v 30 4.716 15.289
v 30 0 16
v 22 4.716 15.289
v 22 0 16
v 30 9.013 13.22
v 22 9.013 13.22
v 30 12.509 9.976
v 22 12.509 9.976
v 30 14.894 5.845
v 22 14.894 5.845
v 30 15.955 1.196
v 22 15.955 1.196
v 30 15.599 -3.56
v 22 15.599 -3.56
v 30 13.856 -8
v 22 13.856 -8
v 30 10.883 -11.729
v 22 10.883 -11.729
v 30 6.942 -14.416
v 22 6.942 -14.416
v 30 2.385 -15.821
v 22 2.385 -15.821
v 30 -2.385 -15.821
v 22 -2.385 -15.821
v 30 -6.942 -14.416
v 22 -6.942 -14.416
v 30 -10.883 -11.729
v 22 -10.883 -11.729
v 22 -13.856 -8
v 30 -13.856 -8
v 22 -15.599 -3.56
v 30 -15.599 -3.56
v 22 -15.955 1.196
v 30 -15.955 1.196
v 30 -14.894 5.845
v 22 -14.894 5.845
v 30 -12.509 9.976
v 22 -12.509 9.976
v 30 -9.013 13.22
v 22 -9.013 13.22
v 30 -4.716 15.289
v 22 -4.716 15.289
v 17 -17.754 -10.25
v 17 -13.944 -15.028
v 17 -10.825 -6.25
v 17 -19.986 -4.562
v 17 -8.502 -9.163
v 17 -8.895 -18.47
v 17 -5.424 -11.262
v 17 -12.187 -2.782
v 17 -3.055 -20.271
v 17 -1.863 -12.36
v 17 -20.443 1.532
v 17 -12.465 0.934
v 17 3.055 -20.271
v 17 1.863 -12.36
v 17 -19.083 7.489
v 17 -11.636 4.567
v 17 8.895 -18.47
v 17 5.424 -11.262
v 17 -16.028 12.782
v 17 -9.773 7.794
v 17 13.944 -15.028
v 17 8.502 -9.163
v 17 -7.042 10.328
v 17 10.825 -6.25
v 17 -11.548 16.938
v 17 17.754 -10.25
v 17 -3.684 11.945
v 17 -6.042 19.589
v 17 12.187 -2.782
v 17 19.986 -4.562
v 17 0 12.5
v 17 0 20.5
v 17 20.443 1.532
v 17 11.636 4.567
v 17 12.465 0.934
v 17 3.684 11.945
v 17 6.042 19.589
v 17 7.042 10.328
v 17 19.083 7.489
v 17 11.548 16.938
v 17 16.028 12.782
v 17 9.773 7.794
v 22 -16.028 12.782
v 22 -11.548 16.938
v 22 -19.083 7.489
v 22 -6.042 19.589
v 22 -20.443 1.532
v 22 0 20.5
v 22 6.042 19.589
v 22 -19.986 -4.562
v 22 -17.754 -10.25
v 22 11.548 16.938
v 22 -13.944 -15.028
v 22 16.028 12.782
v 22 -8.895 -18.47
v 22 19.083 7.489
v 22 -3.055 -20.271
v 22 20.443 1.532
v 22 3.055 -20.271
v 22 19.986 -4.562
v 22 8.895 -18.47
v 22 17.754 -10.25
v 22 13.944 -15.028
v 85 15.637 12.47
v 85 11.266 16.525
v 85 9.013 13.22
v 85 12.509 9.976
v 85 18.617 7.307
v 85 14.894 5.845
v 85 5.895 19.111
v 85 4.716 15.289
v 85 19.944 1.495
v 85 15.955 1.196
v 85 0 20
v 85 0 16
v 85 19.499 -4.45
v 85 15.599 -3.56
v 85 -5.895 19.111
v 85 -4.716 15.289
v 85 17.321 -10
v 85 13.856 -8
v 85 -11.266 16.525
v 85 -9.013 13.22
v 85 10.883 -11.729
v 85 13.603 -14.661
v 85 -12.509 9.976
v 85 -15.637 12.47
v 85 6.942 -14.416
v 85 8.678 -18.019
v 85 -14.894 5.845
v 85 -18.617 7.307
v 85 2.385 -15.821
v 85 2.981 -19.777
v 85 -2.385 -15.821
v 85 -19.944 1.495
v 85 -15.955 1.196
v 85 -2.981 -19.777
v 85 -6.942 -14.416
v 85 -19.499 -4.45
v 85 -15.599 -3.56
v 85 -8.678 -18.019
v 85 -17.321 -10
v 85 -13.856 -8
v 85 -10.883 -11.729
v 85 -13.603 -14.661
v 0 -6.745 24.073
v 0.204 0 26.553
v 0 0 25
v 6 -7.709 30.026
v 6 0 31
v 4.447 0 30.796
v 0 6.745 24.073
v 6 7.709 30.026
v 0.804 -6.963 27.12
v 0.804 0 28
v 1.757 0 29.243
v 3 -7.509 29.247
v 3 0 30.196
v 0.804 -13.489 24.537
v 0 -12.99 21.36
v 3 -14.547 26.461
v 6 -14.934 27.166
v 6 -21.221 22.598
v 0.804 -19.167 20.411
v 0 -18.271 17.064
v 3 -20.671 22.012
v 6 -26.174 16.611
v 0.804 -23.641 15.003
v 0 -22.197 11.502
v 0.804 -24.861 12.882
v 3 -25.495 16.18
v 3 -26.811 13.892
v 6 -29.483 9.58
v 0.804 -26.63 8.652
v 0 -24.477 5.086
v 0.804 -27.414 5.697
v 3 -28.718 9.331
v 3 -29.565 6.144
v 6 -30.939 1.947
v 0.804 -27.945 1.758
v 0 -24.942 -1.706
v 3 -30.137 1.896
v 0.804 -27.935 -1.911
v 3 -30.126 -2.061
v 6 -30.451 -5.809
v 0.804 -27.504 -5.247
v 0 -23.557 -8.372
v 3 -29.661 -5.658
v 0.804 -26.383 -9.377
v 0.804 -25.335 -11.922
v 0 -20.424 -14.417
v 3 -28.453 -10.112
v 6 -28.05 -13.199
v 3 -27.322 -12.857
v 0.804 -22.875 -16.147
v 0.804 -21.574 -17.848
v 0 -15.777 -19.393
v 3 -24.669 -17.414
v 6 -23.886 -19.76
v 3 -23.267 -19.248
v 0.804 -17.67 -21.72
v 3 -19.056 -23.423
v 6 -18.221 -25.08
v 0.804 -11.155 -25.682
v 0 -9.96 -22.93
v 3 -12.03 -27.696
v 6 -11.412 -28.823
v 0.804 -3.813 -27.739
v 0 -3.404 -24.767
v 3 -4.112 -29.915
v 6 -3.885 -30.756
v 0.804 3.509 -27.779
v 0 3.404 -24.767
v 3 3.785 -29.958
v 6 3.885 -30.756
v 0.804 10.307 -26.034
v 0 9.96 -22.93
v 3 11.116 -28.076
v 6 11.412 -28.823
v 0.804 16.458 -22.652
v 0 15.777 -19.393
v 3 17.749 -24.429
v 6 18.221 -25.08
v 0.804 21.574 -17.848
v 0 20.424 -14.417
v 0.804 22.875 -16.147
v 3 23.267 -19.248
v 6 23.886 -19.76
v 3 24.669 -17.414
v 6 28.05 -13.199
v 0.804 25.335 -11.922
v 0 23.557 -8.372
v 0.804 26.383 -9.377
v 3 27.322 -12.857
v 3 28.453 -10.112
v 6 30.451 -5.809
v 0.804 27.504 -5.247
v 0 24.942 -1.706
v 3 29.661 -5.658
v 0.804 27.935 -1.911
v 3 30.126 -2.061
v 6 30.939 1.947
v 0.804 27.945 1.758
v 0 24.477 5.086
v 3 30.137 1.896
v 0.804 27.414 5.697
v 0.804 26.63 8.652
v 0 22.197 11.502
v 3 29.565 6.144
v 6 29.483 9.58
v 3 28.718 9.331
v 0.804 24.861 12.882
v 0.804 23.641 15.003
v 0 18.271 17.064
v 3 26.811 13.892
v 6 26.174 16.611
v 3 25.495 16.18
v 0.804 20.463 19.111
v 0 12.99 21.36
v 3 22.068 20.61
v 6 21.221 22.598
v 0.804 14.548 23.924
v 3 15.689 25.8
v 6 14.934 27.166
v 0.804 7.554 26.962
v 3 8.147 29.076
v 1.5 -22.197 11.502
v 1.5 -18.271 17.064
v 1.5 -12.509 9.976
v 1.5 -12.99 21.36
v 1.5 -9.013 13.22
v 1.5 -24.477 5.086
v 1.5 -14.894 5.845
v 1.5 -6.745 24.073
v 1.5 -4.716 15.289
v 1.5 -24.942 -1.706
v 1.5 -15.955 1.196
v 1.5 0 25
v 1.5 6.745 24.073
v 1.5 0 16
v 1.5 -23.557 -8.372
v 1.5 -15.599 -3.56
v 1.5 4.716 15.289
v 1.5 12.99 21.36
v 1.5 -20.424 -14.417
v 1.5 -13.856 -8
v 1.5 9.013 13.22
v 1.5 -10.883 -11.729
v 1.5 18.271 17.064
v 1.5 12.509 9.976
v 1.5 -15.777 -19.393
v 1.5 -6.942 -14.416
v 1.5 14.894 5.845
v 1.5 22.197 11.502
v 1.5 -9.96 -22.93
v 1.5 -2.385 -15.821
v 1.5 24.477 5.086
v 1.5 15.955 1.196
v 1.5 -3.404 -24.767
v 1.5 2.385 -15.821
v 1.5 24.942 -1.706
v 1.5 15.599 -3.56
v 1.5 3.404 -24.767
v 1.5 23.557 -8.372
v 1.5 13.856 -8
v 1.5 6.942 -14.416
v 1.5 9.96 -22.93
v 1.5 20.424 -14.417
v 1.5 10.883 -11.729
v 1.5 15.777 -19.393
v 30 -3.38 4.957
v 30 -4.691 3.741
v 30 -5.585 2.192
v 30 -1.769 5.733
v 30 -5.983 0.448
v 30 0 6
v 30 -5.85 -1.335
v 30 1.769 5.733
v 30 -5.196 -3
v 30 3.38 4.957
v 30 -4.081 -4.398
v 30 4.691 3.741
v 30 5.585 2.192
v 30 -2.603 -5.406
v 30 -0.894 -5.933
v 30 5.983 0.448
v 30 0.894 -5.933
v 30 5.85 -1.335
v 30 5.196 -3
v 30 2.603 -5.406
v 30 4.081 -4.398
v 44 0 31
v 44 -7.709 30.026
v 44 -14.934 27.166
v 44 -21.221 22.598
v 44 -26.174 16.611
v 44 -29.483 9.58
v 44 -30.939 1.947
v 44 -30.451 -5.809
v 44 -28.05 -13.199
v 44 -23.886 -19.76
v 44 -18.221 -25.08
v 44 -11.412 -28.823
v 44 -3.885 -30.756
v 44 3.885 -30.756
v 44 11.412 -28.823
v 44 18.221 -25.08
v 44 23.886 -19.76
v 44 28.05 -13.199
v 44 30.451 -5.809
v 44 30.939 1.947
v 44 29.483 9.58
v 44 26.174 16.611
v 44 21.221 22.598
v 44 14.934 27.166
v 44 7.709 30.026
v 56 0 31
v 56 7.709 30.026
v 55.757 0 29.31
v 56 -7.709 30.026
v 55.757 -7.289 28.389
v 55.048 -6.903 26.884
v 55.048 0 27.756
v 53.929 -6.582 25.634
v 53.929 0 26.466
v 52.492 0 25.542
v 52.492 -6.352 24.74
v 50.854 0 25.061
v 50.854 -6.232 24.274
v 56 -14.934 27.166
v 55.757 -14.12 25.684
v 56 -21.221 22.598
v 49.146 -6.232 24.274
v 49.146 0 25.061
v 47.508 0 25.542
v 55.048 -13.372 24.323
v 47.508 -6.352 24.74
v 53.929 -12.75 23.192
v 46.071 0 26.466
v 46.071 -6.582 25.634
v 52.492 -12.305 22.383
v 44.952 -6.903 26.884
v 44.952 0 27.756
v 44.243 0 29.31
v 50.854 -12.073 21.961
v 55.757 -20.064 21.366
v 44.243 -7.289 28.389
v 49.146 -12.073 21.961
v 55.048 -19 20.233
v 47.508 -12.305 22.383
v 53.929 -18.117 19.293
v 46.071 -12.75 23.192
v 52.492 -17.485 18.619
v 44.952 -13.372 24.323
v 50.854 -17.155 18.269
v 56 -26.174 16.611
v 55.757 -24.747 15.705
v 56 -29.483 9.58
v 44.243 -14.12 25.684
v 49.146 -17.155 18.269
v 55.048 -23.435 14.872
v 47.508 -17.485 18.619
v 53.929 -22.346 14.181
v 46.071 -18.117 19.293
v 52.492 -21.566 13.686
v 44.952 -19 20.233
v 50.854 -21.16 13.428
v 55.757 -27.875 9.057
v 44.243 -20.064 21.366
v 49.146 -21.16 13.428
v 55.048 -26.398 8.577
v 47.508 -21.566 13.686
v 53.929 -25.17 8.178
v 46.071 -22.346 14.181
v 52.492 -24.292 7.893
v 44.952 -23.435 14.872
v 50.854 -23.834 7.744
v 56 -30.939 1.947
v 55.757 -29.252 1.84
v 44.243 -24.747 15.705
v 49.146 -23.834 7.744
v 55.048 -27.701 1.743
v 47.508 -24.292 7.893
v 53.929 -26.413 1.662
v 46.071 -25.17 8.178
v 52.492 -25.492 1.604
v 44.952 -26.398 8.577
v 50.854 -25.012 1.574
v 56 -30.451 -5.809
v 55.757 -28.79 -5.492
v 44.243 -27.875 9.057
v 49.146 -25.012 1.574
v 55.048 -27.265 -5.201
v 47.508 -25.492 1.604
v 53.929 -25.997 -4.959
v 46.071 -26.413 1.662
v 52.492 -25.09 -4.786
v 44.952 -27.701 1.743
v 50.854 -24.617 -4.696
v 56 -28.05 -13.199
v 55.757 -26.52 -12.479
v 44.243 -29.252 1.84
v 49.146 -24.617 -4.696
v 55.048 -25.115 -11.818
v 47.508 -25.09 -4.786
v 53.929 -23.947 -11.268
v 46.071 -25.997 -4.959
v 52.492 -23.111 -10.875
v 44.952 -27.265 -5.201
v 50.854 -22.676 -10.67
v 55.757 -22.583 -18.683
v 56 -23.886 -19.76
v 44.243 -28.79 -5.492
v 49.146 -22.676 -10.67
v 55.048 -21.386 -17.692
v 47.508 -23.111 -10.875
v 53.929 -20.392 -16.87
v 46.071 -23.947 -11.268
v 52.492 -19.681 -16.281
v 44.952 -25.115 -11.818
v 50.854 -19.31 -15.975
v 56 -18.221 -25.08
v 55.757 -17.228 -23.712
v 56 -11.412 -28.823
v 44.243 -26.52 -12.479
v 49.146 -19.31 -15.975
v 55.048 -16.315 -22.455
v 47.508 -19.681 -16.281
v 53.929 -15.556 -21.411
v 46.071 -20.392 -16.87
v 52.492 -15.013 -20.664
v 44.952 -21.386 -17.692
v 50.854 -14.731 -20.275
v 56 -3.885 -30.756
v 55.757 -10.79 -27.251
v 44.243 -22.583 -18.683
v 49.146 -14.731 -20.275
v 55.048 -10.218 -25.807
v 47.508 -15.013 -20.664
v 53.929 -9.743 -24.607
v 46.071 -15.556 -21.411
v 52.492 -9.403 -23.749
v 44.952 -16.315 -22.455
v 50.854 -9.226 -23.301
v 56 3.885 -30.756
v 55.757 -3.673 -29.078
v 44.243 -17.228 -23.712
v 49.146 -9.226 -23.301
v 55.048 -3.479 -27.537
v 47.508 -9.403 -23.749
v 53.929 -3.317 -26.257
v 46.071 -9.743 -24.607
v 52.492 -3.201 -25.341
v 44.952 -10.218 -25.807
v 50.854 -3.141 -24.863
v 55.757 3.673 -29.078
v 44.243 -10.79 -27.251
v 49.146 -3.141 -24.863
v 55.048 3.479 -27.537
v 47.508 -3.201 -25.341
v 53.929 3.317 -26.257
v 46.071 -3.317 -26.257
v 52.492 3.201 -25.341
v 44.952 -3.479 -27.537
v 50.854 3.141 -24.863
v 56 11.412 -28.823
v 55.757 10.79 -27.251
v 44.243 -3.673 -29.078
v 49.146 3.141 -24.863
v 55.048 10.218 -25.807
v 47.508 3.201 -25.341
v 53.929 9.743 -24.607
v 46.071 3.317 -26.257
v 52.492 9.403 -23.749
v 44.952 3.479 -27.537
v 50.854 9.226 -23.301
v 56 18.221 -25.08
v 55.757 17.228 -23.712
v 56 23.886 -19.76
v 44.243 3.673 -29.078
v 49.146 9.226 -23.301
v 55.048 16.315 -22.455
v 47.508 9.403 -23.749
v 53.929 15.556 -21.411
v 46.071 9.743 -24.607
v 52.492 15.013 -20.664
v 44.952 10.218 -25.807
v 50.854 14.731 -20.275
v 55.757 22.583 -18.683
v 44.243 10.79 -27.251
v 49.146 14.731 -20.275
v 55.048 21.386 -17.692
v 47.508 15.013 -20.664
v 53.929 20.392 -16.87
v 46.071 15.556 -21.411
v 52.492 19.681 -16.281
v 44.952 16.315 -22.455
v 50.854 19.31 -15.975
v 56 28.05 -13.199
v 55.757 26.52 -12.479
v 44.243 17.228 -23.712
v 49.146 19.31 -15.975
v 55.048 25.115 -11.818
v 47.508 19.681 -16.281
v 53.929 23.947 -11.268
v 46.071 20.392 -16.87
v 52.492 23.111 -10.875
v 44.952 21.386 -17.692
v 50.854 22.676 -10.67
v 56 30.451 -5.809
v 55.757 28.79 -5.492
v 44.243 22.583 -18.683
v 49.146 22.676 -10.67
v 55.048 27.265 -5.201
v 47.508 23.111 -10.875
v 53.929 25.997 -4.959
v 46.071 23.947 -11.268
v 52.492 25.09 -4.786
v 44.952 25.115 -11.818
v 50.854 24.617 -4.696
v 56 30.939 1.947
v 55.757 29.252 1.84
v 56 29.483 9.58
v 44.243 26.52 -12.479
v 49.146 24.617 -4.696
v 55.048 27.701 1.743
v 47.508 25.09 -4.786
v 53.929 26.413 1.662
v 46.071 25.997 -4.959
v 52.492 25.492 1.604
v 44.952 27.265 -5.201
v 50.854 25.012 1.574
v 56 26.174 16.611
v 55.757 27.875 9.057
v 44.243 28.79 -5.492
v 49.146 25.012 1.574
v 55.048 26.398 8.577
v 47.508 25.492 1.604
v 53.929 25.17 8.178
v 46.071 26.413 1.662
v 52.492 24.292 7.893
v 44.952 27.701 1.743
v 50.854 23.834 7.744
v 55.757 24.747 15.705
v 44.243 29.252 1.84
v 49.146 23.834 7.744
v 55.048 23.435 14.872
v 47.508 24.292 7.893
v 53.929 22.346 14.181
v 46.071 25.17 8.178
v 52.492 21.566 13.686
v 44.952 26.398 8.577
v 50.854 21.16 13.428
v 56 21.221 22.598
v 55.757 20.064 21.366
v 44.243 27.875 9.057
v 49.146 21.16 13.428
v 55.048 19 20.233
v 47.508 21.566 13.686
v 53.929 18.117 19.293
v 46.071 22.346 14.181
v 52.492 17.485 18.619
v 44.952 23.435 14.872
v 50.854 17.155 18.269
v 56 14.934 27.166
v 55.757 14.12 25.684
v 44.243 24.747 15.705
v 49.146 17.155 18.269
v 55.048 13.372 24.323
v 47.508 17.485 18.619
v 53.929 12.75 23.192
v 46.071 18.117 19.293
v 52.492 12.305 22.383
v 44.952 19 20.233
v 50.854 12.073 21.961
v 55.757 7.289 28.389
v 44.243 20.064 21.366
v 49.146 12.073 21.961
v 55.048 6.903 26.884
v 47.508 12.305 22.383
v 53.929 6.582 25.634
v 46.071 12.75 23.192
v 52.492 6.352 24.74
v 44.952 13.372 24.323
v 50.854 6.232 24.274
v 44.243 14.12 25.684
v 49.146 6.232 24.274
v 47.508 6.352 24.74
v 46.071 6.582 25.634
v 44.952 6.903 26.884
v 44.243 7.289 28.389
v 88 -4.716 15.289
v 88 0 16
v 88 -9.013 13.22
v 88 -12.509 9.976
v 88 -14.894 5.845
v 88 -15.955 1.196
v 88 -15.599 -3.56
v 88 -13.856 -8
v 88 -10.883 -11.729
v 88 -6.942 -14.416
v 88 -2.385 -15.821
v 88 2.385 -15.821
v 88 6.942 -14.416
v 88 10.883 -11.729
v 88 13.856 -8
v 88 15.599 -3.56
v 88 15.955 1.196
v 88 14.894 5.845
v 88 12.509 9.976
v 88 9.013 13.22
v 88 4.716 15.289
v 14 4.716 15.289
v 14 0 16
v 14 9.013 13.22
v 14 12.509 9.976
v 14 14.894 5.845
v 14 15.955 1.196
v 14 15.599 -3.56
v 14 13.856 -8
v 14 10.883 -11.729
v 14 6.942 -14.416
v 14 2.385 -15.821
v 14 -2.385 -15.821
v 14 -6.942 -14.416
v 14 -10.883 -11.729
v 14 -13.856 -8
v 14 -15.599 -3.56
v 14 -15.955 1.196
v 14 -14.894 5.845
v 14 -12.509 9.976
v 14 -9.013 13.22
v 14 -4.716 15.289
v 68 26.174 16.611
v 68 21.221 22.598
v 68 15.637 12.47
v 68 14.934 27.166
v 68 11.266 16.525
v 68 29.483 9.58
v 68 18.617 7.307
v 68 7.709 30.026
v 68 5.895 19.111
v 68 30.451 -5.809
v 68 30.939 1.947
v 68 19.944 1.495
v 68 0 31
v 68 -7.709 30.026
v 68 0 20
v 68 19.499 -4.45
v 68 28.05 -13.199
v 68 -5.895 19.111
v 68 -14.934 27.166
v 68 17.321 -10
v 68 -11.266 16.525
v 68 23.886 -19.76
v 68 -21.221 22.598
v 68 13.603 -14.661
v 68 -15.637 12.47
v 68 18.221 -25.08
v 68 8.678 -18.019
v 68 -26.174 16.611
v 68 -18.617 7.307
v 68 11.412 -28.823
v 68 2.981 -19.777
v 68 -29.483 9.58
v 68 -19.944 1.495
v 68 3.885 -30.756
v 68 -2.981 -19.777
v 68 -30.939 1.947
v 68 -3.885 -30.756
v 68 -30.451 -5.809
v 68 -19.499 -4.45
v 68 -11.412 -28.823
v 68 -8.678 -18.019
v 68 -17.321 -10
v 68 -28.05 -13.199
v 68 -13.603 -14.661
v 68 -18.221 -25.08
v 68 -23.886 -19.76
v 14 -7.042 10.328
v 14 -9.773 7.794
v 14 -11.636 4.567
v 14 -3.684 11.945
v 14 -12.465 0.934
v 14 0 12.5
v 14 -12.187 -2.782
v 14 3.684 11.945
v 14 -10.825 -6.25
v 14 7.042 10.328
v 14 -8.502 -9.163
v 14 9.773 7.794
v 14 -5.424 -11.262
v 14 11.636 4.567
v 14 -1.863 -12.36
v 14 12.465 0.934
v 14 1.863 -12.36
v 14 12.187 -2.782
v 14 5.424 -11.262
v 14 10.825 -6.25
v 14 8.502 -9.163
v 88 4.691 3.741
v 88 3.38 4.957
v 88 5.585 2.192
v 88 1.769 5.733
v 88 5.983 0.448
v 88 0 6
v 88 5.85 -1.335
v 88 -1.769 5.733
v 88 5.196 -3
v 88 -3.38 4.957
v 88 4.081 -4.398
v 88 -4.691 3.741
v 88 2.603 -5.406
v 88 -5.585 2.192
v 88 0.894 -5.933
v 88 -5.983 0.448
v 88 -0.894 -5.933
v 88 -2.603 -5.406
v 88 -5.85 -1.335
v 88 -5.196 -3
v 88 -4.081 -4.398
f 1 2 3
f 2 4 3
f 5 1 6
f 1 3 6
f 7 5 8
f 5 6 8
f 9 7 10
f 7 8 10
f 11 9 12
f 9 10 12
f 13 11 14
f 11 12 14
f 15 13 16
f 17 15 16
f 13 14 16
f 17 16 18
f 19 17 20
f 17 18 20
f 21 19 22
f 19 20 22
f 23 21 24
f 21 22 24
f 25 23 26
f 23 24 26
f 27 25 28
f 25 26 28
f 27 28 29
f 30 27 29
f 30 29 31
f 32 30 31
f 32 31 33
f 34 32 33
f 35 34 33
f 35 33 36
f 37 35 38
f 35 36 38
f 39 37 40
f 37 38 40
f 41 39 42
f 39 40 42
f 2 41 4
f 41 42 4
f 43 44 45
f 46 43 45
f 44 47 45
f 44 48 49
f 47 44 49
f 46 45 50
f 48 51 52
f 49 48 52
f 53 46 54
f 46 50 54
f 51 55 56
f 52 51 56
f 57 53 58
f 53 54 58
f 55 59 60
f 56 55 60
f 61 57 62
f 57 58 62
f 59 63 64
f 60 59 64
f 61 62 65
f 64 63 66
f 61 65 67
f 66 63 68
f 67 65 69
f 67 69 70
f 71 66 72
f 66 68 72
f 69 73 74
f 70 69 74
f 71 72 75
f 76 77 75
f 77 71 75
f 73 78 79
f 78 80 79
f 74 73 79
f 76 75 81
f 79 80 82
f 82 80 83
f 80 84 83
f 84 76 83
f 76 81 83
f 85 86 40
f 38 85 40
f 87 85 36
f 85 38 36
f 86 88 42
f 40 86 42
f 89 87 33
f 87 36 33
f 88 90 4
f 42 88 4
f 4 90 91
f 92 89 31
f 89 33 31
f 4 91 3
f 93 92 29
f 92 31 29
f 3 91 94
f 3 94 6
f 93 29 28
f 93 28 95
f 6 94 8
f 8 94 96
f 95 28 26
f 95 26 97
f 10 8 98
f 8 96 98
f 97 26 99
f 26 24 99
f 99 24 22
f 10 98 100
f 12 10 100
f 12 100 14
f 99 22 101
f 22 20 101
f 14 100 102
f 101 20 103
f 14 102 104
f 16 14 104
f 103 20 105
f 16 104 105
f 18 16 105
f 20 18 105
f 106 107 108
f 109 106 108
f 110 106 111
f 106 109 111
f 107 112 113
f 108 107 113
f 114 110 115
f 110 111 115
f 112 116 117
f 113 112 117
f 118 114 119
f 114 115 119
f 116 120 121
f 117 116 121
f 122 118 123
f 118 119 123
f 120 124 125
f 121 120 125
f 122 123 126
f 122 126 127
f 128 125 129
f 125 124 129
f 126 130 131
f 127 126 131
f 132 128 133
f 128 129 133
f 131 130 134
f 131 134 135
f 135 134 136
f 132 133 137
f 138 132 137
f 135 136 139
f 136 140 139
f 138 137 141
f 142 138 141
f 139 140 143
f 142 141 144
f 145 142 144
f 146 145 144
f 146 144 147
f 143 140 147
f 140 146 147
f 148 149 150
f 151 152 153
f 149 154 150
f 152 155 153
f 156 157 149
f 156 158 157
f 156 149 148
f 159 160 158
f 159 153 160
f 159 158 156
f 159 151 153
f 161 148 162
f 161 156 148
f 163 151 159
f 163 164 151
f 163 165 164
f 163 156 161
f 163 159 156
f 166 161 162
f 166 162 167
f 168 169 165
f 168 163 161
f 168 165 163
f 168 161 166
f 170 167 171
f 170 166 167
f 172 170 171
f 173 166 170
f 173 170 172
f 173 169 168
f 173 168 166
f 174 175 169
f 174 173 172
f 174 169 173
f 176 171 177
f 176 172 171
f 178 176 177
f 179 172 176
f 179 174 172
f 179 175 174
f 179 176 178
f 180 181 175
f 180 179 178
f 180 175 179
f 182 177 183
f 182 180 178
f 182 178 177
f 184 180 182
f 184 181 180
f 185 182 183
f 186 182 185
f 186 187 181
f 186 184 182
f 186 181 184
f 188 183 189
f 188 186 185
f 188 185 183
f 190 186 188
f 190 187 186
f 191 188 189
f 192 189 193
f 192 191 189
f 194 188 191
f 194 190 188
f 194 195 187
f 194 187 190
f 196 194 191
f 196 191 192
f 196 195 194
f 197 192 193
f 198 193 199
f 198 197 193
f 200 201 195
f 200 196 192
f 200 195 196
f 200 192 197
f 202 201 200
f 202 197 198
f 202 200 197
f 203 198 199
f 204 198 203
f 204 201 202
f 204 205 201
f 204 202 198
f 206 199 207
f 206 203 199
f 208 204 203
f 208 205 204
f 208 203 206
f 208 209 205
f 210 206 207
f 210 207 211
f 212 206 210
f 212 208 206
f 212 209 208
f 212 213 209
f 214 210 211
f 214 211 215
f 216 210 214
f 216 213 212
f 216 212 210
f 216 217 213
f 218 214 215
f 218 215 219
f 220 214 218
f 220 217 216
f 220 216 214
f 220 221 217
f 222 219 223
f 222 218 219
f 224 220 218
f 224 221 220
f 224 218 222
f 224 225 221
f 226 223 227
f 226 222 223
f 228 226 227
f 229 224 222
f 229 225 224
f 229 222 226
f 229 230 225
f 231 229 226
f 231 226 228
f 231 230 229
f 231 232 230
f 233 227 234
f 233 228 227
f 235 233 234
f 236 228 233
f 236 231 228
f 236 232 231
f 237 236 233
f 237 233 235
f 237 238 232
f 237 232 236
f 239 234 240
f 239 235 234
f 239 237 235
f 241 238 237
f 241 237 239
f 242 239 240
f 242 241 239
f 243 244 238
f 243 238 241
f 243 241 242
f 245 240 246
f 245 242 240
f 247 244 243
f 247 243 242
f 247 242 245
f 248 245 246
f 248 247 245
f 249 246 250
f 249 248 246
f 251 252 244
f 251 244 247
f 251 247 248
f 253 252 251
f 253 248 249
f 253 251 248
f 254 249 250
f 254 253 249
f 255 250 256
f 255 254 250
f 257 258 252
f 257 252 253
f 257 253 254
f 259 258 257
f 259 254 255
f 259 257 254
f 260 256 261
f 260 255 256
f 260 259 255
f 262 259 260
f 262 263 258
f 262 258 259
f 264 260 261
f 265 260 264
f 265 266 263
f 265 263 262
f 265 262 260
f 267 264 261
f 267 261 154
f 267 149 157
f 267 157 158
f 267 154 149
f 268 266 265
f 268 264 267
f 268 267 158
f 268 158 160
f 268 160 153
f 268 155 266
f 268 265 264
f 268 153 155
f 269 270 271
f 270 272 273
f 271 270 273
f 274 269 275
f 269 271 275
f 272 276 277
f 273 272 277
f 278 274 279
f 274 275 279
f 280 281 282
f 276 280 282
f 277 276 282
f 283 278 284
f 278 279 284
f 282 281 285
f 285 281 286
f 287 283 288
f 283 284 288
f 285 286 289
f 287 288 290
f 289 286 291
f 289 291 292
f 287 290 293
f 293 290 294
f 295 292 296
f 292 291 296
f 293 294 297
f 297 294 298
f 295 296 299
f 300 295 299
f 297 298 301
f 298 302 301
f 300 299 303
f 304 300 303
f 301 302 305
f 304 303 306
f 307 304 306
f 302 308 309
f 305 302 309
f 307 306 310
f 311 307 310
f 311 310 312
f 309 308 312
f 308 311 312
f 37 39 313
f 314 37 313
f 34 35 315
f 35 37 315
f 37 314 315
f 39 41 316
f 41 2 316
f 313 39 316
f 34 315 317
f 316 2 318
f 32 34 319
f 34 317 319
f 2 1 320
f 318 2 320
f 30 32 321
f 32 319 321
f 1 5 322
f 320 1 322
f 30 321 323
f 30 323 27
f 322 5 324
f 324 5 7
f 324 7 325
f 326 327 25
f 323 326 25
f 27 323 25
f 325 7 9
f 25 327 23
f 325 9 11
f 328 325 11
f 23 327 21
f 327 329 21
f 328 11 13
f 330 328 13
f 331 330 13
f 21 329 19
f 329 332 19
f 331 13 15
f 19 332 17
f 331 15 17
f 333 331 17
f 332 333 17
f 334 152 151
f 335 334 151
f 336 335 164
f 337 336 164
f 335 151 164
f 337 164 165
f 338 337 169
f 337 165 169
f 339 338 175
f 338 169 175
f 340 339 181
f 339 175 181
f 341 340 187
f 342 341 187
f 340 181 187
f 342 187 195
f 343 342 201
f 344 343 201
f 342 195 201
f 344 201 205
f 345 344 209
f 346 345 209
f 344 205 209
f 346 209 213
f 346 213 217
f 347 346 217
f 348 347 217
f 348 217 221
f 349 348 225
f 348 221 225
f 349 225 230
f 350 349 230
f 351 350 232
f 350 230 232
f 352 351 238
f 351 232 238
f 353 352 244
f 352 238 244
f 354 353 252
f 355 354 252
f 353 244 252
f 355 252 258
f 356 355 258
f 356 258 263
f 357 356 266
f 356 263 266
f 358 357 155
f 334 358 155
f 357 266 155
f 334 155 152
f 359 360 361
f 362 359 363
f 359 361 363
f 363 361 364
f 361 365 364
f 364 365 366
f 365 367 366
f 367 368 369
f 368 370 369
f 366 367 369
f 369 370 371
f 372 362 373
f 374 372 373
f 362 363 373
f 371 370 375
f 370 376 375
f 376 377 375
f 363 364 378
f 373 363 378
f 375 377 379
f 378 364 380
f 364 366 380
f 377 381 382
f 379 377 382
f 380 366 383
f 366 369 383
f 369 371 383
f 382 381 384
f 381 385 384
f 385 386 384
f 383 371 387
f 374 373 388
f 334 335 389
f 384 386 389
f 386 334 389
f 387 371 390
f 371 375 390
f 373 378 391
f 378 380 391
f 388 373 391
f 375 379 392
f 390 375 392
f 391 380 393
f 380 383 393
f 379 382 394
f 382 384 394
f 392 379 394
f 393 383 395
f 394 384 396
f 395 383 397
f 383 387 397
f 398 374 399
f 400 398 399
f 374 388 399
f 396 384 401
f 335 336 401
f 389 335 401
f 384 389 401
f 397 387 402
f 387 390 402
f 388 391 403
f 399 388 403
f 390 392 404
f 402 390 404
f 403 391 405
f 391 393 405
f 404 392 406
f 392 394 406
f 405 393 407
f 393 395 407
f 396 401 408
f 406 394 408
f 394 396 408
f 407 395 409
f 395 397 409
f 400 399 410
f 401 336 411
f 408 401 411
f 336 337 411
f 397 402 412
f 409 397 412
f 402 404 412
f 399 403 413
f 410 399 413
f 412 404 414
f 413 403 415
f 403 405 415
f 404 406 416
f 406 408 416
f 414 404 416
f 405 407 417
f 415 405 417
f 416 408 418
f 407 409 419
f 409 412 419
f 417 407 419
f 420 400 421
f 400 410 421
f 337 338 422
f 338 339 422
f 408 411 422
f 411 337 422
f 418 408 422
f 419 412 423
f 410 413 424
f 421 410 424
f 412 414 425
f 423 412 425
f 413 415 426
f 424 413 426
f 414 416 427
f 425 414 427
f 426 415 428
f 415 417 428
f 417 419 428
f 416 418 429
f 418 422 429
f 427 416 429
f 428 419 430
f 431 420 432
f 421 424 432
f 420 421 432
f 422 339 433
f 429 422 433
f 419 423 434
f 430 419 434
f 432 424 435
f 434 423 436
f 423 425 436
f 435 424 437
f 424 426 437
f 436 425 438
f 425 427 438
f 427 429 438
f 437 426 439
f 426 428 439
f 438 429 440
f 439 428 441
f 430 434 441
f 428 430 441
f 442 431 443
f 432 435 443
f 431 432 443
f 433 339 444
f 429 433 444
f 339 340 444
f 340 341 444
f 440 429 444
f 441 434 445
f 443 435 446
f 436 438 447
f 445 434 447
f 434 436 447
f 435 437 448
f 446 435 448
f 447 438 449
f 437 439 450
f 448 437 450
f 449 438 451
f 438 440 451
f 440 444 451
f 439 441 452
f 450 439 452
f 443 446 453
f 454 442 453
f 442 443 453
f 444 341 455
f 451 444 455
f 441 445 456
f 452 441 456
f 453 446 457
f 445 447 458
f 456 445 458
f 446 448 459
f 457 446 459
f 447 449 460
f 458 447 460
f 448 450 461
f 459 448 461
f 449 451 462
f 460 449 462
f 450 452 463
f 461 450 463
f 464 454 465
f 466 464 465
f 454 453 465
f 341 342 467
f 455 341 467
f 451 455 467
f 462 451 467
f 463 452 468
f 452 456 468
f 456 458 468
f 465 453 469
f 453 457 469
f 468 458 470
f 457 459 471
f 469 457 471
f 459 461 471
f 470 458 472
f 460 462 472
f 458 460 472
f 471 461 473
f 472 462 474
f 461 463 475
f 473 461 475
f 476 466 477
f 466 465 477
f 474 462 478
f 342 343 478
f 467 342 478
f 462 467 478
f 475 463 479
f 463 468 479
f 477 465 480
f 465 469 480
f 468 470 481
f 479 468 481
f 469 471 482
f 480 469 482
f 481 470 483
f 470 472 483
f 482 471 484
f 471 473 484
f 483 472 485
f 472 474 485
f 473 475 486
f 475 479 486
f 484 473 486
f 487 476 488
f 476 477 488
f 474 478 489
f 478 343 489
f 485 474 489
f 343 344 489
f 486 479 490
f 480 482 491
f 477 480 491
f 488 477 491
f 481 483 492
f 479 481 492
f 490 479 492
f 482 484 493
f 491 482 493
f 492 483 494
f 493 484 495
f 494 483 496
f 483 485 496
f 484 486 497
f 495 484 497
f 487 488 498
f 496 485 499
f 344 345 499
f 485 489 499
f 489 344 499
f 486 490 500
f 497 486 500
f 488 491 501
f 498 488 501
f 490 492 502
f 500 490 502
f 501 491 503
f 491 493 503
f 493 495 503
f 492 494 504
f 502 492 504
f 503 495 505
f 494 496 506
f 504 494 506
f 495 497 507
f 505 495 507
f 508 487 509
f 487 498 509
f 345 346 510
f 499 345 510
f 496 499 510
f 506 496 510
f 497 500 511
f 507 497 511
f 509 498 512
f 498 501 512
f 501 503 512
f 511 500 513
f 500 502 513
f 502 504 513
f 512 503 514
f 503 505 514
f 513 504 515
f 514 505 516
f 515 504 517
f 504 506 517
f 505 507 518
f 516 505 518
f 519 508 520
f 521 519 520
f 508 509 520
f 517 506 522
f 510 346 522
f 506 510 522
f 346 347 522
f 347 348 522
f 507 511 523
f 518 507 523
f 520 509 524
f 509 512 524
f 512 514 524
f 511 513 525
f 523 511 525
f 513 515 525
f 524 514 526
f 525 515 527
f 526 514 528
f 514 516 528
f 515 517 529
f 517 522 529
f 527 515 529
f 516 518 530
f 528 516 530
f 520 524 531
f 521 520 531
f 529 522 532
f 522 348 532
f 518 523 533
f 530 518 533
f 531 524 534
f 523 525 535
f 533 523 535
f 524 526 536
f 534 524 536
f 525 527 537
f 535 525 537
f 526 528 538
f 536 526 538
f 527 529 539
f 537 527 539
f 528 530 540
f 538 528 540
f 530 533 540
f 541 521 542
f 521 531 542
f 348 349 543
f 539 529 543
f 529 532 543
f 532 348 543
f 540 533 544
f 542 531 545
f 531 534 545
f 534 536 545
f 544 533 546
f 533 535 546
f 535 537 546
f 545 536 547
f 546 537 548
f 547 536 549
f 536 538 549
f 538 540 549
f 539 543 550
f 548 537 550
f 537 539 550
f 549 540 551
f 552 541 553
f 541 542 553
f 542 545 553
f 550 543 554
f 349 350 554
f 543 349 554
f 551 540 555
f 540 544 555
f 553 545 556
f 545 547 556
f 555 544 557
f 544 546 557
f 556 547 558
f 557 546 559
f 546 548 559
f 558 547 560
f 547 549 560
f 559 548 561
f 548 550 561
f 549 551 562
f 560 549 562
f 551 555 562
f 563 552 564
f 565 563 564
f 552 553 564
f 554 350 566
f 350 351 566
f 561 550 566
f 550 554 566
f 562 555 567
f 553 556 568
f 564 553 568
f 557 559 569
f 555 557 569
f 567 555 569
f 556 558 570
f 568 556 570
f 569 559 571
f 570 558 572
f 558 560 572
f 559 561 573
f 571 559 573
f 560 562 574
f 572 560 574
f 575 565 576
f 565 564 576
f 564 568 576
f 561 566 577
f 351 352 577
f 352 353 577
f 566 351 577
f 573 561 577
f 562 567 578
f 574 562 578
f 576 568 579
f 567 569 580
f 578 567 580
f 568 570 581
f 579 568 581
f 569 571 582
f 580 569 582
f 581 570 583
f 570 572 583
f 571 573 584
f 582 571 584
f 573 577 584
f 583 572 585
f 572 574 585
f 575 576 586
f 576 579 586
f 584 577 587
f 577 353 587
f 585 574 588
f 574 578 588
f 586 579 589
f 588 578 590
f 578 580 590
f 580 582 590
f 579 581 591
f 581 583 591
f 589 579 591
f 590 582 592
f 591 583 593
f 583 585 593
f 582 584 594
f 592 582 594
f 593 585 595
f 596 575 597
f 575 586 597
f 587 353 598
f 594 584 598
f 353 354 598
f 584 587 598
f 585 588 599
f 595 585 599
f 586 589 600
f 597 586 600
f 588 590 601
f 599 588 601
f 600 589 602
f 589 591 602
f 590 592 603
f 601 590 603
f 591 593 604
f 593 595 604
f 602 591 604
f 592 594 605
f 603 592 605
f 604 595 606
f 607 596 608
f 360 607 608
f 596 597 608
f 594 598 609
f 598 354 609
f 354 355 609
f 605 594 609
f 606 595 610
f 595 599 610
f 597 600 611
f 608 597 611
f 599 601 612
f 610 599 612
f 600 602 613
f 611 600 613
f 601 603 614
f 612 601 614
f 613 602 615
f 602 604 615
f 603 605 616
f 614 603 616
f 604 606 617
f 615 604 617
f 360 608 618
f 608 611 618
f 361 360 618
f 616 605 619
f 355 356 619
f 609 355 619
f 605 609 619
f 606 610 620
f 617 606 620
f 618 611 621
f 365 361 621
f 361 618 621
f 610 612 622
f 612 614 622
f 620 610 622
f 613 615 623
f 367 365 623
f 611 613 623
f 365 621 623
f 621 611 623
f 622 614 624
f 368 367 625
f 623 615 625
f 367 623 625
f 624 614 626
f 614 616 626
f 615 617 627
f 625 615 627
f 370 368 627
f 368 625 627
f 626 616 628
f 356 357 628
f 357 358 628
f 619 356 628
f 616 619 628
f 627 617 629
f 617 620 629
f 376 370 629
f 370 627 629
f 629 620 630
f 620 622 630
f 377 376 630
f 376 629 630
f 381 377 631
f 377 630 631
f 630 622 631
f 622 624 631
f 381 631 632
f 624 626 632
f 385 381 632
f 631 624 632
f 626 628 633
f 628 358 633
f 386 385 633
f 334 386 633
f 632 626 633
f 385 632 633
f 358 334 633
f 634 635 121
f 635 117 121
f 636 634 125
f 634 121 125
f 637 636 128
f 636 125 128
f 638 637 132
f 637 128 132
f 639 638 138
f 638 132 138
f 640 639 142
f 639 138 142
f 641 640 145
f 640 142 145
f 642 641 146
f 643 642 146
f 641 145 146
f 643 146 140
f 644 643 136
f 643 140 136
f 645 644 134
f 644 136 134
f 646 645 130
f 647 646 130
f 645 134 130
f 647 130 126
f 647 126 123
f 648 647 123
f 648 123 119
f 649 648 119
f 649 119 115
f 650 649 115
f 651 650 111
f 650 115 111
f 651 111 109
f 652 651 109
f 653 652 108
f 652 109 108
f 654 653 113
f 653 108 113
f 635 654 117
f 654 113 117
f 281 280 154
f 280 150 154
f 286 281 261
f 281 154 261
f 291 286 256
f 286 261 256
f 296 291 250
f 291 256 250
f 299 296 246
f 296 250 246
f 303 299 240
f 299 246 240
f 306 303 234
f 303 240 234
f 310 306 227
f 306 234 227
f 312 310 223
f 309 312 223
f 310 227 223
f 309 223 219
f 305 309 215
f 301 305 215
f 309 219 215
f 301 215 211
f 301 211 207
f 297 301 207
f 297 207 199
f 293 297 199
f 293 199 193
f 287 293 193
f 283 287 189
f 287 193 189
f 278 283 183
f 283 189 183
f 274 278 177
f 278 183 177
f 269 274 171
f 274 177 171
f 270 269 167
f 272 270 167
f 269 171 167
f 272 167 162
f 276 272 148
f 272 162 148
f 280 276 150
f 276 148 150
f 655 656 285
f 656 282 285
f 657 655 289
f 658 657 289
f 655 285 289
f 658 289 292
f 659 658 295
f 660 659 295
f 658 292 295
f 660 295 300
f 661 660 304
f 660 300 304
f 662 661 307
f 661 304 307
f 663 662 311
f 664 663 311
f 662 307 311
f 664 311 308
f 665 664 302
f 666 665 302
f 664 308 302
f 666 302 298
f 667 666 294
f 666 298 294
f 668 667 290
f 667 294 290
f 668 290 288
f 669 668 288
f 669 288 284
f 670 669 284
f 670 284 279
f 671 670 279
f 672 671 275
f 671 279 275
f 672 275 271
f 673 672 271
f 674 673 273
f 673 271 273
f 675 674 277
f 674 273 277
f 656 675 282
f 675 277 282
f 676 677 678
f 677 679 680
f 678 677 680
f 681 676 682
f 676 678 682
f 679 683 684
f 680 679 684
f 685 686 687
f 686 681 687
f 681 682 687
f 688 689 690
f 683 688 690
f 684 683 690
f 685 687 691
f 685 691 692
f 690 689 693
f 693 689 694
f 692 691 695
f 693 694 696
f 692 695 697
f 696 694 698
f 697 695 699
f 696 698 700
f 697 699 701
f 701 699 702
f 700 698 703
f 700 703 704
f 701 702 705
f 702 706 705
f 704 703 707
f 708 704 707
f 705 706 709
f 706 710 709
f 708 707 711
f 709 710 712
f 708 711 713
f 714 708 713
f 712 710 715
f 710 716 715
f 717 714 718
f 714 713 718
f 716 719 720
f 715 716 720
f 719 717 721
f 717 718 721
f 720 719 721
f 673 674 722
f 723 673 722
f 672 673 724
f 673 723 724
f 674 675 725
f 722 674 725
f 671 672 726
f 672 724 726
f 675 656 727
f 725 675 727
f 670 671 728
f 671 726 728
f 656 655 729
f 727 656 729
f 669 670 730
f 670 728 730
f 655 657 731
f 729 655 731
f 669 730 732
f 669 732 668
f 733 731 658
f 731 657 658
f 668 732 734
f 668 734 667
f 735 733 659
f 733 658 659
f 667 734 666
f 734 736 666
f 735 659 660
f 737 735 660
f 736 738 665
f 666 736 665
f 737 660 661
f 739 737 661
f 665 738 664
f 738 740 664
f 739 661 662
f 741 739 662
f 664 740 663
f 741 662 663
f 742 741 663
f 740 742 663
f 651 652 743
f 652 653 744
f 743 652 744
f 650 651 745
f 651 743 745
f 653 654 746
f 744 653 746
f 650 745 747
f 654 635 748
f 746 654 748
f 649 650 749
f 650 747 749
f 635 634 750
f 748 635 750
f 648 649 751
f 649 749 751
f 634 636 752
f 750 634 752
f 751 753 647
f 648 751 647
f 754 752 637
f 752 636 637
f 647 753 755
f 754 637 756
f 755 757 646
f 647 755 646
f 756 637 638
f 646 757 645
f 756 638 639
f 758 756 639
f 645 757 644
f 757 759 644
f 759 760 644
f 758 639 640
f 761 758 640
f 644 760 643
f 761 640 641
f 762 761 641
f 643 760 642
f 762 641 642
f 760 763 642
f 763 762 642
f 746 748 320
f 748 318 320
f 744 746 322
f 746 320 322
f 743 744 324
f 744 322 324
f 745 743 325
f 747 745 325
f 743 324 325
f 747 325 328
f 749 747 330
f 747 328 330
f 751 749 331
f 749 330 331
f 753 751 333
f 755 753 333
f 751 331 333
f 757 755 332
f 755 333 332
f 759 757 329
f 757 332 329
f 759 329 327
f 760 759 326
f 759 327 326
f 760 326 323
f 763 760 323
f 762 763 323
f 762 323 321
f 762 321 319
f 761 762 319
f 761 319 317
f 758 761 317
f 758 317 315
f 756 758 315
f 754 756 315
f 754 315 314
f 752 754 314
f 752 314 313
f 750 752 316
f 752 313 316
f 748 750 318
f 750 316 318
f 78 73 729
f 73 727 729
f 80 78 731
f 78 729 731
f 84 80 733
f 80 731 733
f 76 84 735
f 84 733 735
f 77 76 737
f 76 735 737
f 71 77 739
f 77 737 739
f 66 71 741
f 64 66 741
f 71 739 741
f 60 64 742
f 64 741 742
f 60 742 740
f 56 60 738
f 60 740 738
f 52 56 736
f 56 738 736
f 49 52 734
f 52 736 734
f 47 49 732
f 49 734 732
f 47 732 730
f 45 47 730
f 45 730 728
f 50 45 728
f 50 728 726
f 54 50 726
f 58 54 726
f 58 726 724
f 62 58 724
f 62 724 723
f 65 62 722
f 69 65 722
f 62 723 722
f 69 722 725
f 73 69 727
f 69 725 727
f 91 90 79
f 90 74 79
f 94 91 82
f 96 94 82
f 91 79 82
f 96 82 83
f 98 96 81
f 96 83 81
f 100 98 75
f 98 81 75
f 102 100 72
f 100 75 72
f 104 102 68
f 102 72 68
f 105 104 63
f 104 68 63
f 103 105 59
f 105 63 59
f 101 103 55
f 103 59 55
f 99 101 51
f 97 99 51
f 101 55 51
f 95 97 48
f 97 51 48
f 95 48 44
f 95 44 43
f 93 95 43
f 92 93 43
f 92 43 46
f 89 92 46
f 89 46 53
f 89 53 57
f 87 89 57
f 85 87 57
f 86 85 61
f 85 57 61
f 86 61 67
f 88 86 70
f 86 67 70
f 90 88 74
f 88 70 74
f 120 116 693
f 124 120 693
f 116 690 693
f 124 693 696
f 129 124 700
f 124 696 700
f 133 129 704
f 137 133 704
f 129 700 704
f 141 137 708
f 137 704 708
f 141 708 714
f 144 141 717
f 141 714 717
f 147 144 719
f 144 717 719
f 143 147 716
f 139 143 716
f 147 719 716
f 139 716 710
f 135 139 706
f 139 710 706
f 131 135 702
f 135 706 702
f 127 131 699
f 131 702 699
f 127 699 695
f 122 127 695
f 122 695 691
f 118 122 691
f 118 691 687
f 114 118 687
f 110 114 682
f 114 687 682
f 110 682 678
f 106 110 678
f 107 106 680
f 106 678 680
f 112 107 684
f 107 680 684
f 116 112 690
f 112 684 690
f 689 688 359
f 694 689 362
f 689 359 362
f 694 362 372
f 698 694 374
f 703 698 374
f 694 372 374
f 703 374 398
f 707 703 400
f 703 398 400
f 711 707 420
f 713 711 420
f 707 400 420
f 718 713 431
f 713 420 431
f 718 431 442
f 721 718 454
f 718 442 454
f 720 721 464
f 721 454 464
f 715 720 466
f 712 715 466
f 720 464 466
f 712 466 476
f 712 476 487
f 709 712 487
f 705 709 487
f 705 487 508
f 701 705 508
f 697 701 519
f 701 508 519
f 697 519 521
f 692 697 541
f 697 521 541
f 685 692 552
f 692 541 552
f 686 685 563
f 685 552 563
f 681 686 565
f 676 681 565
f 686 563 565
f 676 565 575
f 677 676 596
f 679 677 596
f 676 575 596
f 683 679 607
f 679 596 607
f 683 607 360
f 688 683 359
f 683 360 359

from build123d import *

# Parameters (mm, degrees)
F4_R = 5.99999


# Not quite as in the source:
# - a fillet or chamfer is up to 0.001 mm smaller than in the source, because OpenCascade refuses the exact size


with BuildPart() as f1:
    # F0 (on Front) → F1 (revolve)
    with BuildSketch(Plane.XZ):
        with BuildLine():
            Line((0, 31), (0, 0))
            Line((0, 0), (88, 0))
            Line((88, 0), (88, 16))
            Line((88, 16), (85, 16))
            Line((85, 16), (85, 20))
            Line((85, 20), (68, 20))
            Line((68, 20), (68, 31))
            Line((68, 31), (56, 31))
            ThreePointArc((56, 31), (50, 25), (44, 31))
            Line((44, 31), (0, 31))
        make_face()
    revolve(axis=Axis((56.2561290468, 0, 0), (1, 0, 0)))

    # F2 (on Front) → F3 (revolve, cut)
    with BuildSketch(Plane.XZ):
        Polygon((0, 25), (0, 0), (88, 0), (88, 6), (30, 6), (30, 16), (22, 16), (22, 20.5), (17, 20.5), (17, 12.5), (14, 12.5), (14, 16), (1.5, 16), (1.5, 25), align=None)
    revolve(axis=Axis((-8.4188580513, 0, 0), (-1, 0, 0)), mode=Mode.SUBTRACT)

    # F4 (radius 6 in the source; OpenCascade refuses exactly that, so slightly less here)
    f4_edges = [f1.edges().sort_by_distance(p)[0] for p in [
        (0, 0, -31),
    ]]
    fillet(f4_edges, radius=F4_R)


solid = f1.part
